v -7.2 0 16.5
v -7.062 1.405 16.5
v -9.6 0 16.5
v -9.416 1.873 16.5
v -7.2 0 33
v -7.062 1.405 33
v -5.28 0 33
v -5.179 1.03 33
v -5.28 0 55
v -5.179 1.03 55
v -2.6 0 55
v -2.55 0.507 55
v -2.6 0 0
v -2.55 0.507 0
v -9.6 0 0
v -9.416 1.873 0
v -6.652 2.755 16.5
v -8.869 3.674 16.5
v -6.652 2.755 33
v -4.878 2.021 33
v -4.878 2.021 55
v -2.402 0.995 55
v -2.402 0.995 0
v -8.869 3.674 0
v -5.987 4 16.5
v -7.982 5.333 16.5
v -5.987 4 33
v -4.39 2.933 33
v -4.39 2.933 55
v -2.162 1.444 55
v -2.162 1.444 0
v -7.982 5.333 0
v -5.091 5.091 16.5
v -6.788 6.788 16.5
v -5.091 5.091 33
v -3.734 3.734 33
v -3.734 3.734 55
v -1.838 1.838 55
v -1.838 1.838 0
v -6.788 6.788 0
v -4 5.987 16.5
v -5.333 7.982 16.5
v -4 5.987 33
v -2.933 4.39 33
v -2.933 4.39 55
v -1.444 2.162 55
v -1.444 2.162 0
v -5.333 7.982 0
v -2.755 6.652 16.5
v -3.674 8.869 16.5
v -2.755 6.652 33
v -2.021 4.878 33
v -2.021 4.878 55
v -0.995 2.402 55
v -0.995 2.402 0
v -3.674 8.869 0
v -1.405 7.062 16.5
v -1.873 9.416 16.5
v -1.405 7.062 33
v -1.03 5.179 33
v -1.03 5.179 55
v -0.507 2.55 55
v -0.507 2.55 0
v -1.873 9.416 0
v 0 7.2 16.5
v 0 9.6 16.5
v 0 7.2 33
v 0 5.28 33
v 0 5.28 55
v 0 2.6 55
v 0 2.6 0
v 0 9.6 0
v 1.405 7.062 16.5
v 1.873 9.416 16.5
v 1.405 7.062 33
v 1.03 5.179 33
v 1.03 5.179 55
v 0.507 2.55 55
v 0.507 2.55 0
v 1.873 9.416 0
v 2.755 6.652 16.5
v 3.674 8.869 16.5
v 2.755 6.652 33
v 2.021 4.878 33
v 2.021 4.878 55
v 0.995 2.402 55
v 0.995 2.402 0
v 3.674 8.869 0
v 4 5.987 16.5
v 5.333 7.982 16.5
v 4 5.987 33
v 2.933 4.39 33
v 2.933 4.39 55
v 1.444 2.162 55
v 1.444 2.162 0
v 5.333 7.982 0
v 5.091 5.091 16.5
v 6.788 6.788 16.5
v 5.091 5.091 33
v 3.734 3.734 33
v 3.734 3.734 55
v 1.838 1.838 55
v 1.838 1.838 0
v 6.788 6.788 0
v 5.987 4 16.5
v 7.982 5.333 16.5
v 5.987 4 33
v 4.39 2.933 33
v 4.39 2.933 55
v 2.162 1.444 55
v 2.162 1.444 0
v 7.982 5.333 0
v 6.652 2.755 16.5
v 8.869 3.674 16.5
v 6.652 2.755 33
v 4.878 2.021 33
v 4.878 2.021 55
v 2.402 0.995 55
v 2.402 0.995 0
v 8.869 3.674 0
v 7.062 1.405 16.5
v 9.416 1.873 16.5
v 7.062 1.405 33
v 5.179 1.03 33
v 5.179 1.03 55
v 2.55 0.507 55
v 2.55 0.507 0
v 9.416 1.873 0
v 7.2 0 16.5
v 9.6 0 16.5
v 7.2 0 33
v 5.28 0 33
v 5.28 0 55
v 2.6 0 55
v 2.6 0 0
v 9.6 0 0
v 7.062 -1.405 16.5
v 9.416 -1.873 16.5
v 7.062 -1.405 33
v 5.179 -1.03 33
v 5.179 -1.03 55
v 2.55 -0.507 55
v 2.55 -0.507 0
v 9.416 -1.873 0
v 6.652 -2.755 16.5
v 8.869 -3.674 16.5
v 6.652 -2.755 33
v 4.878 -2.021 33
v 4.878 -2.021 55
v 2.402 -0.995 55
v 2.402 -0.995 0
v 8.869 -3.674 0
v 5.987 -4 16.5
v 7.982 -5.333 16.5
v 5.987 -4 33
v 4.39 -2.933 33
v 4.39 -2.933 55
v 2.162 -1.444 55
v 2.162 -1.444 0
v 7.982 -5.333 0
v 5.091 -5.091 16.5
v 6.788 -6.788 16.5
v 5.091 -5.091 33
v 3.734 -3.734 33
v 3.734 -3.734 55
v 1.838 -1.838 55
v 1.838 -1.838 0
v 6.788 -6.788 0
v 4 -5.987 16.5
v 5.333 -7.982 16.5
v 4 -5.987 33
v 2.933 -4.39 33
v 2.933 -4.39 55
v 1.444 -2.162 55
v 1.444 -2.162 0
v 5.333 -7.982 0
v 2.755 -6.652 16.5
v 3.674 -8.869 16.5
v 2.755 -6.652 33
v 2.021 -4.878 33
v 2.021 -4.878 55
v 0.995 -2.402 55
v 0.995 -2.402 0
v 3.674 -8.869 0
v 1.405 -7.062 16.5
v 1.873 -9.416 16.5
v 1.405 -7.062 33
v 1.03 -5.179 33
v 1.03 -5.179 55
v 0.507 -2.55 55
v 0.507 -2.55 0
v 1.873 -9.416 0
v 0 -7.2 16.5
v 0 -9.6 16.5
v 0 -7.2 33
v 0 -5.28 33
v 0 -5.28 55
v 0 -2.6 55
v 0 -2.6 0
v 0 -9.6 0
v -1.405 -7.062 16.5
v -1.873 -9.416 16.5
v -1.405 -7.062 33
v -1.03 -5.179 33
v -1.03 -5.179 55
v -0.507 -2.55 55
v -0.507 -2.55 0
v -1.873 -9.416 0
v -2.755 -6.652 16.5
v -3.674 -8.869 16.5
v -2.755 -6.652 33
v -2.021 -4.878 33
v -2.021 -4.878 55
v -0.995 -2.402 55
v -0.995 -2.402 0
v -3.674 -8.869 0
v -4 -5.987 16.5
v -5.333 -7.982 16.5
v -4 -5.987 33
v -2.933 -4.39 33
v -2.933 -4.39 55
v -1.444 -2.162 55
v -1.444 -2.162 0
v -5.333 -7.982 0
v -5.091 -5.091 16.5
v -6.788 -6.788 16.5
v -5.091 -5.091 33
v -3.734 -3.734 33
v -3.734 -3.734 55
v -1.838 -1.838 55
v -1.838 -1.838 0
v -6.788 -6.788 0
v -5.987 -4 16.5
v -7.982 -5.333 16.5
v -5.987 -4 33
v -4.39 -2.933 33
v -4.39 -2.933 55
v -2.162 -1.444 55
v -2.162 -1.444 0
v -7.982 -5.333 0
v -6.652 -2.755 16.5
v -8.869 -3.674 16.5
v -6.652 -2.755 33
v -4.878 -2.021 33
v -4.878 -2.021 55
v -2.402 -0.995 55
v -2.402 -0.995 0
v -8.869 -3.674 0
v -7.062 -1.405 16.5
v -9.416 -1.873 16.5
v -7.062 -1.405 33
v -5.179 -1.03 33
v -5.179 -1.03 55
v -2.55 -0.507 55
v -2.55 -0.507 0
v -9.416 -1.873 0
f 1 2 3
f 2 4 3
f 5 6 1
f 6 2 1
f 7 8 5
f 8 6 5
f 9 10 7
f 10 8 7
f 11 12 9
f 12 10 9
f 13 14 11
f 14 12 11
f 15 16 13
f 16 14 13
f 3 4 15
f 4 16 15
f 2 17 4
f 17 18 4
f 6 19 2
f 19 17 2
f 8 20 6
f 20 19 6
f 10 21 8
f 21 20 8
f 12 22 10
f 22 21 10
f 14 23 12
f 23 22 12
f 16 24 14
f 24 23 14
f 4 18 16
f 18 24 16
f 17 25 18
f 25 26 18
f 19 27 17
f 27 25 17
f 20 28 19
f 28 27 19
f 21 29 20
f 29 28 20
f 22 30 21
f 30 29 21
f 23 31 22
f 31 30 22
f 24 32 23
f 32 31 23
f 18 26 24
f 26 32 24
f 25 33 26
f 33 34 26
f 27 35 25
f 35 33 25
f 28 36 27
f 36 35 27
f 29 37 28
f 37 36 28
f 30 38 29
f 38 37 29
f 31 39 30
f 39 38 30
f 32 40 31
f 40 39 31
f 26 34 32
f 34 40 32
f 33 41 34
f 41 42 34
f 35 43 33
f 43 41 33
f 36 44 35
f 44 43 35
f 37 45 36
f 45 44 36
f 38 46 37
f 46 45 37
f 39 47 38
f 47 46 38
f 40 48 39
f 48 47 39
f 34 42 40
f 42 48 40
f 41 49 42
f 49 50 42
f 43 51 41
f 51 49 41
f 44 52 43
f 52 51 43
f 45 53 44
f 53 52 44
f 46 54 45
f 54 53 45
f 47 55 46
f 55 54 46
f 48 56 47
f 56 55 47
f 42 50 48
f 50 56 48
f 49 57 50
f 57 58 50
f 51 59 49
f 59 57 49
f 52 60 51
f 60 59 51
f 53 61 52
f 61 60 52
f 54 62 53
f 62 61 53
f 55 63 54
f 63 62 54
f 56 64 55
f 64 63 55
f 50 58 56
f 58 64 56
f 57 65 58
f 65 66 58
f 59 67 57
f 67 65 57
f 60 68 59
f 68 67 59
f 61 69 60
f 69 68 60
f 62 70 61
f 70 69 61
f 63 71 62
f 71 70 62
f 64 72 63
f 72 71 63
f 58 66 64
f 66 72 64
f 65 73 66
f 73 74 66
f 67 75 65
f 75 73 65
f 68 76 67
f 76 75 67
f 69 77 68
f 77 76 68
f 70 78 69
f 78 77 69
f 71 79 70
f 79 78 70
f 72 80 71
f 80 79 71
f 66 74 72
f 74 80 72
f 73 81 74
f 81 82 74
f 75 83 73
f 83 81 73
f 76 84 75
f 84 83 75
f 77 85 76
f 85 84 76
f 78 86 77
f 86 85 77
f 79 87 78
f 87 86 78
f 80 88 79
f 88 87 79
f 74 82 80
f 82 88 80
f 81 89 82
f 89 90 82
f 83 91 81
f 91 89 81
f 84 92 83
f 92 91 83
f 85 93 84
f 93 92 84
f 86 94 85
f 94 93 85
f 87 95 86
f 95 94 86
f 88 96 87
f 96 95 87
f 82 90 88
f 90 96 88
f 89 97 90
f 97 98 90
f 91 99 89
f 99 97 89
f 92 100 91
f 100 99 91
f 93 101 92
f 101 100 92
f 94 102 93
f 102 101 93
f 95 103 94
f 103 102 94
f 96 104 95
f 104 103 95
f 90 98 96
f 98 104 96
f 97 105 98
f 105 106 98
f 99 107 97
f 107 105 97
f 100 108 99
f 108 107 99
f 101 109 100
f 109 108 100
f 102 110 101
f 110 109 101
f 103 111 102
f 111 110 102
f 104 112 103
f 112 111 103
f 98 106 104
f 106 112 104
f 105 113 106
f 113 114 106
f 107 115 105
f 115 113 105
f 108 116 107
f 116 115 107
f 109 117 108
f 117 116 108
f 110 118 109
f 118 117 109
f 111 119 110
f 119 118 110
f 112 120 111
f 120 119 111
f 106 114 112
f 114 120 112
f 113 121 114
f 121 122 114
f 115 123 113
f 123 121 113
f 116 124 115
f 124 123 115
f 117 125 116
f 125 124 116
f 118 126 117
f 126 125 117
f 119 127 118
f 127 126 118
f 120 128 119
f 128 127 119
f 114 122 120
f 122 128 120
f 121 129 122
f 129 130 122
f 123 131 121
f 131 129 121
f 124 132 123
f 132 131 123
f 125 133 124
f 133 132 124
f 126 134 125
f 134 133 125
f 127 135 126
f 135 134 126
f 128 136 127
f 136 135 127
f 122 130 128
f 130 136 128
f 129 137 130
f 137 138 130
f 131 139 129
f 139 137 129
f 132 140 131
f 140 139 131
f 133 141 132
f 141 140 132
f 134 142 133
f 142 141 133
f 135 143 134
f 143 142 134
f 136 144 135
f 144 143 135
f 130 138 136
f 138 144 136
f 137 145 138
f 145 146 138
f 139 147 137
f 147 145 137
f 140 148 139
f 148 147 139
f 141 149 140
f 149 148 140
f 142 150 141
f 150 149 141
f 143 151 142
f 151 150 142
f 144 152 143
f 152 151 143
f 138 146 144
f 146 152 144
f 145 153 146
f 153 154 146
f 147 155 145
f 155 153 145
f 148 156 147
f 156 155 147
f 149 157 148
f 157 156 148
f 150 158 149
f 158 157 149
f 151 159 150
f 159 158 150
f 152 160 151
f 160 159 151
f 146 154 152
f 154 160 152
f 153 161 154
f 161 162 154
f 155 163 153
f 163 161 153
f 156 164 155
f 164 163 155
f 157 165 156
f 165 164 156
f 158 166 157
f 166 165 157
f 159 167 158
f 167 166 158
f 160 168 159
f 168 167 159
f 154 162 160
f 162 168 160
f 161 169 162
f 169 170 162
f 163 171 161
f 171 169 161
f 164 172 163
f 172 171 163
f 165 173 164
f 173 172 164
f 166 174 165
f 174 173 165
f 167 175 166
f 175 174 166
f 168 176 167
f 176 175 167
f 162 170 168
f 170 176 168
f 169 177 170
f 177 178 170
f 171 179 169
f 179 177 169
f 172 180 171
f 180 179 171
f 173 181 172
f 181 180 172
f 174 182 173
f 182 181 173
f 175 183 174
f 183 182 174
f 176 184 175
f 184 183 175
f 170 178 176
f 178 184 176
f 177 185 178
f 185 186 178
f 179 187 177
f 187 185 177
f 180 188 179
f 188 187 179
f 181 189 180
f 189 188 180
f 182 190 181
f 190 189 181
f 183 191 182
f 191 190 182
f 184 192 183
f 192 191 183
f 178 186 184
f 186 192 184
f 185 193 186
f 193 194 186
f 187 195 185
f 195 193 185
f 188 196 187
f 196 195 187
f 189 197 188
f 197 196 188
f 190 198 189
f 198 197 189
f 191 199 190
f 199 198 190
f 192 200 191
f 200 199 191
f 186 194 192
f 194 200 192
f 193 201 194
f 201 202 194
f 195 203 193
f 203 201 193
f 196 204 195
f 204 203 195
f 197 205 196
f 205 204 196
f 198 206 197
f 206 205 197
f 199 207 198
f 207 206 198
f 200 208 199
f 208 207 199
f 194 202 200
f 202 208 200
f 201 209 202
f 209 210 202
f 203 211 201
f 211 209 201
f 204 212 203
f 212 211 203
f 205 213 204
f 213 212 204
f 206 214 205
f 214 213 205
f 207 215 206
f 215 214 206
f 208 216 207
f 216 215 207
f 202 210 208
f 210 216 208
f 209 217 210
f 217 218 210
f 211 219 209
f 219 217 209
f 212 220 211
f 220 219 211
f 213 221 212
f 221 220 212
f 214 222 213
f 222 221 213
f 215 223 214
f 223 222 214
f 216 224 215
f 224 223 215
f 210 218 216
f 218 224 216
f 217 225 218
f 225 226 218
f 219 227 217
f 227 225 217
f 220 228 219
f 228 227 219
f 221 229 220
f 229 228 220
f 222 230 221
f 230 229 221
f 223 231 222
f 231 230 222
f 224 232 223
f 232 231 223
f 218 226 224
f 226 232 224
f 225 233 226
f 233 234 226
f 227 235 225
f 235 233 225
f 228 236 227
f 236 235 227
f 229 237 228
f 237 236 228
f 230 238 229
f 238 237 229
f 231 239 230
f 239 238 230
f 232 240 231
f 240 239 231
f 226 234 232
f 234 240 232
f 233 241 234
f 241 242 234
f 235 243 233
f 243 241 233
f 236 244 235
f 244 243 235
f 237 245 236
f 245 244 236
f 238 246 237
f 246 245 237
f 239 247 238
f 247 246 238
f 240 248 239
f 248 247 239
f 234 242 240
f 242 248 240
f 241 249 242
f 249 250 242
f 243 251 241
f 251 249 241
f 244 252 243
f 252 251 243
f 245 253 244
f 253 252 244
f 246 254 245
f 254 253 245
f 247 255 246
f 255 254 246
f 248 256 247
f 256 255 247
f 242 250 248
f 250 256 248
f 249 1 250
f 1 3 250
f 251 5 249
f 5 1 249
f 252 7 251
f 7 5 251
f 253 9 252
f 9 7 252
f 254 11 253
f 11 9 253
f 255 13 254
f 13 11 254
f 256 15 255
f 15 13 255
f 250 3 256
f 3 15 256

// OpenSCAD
$fn = 32;

// ----------------------------------------------------------------------
// Profiled standoff: stepped spacer, 55 mm long, bore 5.2 mm
// ----------------------------------------------------------------------

// --- parameters (mm) ---
revolve_angle = 360;      // full turn around the Z axis
profile_points = 8;       // points of the closed outline

profile = [[2.6, 0], [9.6, 0], [9.6, 16.5], [7.2, 16.5], [7.2, 33], [5.28, 33], [5.28, 55], [2.6, 55]];  // single closed polygon, 8 points, counter clockwise

// --- the one profile operation ---
rotate_extrude(angle = revolve_angle) polygon(points = profile);
